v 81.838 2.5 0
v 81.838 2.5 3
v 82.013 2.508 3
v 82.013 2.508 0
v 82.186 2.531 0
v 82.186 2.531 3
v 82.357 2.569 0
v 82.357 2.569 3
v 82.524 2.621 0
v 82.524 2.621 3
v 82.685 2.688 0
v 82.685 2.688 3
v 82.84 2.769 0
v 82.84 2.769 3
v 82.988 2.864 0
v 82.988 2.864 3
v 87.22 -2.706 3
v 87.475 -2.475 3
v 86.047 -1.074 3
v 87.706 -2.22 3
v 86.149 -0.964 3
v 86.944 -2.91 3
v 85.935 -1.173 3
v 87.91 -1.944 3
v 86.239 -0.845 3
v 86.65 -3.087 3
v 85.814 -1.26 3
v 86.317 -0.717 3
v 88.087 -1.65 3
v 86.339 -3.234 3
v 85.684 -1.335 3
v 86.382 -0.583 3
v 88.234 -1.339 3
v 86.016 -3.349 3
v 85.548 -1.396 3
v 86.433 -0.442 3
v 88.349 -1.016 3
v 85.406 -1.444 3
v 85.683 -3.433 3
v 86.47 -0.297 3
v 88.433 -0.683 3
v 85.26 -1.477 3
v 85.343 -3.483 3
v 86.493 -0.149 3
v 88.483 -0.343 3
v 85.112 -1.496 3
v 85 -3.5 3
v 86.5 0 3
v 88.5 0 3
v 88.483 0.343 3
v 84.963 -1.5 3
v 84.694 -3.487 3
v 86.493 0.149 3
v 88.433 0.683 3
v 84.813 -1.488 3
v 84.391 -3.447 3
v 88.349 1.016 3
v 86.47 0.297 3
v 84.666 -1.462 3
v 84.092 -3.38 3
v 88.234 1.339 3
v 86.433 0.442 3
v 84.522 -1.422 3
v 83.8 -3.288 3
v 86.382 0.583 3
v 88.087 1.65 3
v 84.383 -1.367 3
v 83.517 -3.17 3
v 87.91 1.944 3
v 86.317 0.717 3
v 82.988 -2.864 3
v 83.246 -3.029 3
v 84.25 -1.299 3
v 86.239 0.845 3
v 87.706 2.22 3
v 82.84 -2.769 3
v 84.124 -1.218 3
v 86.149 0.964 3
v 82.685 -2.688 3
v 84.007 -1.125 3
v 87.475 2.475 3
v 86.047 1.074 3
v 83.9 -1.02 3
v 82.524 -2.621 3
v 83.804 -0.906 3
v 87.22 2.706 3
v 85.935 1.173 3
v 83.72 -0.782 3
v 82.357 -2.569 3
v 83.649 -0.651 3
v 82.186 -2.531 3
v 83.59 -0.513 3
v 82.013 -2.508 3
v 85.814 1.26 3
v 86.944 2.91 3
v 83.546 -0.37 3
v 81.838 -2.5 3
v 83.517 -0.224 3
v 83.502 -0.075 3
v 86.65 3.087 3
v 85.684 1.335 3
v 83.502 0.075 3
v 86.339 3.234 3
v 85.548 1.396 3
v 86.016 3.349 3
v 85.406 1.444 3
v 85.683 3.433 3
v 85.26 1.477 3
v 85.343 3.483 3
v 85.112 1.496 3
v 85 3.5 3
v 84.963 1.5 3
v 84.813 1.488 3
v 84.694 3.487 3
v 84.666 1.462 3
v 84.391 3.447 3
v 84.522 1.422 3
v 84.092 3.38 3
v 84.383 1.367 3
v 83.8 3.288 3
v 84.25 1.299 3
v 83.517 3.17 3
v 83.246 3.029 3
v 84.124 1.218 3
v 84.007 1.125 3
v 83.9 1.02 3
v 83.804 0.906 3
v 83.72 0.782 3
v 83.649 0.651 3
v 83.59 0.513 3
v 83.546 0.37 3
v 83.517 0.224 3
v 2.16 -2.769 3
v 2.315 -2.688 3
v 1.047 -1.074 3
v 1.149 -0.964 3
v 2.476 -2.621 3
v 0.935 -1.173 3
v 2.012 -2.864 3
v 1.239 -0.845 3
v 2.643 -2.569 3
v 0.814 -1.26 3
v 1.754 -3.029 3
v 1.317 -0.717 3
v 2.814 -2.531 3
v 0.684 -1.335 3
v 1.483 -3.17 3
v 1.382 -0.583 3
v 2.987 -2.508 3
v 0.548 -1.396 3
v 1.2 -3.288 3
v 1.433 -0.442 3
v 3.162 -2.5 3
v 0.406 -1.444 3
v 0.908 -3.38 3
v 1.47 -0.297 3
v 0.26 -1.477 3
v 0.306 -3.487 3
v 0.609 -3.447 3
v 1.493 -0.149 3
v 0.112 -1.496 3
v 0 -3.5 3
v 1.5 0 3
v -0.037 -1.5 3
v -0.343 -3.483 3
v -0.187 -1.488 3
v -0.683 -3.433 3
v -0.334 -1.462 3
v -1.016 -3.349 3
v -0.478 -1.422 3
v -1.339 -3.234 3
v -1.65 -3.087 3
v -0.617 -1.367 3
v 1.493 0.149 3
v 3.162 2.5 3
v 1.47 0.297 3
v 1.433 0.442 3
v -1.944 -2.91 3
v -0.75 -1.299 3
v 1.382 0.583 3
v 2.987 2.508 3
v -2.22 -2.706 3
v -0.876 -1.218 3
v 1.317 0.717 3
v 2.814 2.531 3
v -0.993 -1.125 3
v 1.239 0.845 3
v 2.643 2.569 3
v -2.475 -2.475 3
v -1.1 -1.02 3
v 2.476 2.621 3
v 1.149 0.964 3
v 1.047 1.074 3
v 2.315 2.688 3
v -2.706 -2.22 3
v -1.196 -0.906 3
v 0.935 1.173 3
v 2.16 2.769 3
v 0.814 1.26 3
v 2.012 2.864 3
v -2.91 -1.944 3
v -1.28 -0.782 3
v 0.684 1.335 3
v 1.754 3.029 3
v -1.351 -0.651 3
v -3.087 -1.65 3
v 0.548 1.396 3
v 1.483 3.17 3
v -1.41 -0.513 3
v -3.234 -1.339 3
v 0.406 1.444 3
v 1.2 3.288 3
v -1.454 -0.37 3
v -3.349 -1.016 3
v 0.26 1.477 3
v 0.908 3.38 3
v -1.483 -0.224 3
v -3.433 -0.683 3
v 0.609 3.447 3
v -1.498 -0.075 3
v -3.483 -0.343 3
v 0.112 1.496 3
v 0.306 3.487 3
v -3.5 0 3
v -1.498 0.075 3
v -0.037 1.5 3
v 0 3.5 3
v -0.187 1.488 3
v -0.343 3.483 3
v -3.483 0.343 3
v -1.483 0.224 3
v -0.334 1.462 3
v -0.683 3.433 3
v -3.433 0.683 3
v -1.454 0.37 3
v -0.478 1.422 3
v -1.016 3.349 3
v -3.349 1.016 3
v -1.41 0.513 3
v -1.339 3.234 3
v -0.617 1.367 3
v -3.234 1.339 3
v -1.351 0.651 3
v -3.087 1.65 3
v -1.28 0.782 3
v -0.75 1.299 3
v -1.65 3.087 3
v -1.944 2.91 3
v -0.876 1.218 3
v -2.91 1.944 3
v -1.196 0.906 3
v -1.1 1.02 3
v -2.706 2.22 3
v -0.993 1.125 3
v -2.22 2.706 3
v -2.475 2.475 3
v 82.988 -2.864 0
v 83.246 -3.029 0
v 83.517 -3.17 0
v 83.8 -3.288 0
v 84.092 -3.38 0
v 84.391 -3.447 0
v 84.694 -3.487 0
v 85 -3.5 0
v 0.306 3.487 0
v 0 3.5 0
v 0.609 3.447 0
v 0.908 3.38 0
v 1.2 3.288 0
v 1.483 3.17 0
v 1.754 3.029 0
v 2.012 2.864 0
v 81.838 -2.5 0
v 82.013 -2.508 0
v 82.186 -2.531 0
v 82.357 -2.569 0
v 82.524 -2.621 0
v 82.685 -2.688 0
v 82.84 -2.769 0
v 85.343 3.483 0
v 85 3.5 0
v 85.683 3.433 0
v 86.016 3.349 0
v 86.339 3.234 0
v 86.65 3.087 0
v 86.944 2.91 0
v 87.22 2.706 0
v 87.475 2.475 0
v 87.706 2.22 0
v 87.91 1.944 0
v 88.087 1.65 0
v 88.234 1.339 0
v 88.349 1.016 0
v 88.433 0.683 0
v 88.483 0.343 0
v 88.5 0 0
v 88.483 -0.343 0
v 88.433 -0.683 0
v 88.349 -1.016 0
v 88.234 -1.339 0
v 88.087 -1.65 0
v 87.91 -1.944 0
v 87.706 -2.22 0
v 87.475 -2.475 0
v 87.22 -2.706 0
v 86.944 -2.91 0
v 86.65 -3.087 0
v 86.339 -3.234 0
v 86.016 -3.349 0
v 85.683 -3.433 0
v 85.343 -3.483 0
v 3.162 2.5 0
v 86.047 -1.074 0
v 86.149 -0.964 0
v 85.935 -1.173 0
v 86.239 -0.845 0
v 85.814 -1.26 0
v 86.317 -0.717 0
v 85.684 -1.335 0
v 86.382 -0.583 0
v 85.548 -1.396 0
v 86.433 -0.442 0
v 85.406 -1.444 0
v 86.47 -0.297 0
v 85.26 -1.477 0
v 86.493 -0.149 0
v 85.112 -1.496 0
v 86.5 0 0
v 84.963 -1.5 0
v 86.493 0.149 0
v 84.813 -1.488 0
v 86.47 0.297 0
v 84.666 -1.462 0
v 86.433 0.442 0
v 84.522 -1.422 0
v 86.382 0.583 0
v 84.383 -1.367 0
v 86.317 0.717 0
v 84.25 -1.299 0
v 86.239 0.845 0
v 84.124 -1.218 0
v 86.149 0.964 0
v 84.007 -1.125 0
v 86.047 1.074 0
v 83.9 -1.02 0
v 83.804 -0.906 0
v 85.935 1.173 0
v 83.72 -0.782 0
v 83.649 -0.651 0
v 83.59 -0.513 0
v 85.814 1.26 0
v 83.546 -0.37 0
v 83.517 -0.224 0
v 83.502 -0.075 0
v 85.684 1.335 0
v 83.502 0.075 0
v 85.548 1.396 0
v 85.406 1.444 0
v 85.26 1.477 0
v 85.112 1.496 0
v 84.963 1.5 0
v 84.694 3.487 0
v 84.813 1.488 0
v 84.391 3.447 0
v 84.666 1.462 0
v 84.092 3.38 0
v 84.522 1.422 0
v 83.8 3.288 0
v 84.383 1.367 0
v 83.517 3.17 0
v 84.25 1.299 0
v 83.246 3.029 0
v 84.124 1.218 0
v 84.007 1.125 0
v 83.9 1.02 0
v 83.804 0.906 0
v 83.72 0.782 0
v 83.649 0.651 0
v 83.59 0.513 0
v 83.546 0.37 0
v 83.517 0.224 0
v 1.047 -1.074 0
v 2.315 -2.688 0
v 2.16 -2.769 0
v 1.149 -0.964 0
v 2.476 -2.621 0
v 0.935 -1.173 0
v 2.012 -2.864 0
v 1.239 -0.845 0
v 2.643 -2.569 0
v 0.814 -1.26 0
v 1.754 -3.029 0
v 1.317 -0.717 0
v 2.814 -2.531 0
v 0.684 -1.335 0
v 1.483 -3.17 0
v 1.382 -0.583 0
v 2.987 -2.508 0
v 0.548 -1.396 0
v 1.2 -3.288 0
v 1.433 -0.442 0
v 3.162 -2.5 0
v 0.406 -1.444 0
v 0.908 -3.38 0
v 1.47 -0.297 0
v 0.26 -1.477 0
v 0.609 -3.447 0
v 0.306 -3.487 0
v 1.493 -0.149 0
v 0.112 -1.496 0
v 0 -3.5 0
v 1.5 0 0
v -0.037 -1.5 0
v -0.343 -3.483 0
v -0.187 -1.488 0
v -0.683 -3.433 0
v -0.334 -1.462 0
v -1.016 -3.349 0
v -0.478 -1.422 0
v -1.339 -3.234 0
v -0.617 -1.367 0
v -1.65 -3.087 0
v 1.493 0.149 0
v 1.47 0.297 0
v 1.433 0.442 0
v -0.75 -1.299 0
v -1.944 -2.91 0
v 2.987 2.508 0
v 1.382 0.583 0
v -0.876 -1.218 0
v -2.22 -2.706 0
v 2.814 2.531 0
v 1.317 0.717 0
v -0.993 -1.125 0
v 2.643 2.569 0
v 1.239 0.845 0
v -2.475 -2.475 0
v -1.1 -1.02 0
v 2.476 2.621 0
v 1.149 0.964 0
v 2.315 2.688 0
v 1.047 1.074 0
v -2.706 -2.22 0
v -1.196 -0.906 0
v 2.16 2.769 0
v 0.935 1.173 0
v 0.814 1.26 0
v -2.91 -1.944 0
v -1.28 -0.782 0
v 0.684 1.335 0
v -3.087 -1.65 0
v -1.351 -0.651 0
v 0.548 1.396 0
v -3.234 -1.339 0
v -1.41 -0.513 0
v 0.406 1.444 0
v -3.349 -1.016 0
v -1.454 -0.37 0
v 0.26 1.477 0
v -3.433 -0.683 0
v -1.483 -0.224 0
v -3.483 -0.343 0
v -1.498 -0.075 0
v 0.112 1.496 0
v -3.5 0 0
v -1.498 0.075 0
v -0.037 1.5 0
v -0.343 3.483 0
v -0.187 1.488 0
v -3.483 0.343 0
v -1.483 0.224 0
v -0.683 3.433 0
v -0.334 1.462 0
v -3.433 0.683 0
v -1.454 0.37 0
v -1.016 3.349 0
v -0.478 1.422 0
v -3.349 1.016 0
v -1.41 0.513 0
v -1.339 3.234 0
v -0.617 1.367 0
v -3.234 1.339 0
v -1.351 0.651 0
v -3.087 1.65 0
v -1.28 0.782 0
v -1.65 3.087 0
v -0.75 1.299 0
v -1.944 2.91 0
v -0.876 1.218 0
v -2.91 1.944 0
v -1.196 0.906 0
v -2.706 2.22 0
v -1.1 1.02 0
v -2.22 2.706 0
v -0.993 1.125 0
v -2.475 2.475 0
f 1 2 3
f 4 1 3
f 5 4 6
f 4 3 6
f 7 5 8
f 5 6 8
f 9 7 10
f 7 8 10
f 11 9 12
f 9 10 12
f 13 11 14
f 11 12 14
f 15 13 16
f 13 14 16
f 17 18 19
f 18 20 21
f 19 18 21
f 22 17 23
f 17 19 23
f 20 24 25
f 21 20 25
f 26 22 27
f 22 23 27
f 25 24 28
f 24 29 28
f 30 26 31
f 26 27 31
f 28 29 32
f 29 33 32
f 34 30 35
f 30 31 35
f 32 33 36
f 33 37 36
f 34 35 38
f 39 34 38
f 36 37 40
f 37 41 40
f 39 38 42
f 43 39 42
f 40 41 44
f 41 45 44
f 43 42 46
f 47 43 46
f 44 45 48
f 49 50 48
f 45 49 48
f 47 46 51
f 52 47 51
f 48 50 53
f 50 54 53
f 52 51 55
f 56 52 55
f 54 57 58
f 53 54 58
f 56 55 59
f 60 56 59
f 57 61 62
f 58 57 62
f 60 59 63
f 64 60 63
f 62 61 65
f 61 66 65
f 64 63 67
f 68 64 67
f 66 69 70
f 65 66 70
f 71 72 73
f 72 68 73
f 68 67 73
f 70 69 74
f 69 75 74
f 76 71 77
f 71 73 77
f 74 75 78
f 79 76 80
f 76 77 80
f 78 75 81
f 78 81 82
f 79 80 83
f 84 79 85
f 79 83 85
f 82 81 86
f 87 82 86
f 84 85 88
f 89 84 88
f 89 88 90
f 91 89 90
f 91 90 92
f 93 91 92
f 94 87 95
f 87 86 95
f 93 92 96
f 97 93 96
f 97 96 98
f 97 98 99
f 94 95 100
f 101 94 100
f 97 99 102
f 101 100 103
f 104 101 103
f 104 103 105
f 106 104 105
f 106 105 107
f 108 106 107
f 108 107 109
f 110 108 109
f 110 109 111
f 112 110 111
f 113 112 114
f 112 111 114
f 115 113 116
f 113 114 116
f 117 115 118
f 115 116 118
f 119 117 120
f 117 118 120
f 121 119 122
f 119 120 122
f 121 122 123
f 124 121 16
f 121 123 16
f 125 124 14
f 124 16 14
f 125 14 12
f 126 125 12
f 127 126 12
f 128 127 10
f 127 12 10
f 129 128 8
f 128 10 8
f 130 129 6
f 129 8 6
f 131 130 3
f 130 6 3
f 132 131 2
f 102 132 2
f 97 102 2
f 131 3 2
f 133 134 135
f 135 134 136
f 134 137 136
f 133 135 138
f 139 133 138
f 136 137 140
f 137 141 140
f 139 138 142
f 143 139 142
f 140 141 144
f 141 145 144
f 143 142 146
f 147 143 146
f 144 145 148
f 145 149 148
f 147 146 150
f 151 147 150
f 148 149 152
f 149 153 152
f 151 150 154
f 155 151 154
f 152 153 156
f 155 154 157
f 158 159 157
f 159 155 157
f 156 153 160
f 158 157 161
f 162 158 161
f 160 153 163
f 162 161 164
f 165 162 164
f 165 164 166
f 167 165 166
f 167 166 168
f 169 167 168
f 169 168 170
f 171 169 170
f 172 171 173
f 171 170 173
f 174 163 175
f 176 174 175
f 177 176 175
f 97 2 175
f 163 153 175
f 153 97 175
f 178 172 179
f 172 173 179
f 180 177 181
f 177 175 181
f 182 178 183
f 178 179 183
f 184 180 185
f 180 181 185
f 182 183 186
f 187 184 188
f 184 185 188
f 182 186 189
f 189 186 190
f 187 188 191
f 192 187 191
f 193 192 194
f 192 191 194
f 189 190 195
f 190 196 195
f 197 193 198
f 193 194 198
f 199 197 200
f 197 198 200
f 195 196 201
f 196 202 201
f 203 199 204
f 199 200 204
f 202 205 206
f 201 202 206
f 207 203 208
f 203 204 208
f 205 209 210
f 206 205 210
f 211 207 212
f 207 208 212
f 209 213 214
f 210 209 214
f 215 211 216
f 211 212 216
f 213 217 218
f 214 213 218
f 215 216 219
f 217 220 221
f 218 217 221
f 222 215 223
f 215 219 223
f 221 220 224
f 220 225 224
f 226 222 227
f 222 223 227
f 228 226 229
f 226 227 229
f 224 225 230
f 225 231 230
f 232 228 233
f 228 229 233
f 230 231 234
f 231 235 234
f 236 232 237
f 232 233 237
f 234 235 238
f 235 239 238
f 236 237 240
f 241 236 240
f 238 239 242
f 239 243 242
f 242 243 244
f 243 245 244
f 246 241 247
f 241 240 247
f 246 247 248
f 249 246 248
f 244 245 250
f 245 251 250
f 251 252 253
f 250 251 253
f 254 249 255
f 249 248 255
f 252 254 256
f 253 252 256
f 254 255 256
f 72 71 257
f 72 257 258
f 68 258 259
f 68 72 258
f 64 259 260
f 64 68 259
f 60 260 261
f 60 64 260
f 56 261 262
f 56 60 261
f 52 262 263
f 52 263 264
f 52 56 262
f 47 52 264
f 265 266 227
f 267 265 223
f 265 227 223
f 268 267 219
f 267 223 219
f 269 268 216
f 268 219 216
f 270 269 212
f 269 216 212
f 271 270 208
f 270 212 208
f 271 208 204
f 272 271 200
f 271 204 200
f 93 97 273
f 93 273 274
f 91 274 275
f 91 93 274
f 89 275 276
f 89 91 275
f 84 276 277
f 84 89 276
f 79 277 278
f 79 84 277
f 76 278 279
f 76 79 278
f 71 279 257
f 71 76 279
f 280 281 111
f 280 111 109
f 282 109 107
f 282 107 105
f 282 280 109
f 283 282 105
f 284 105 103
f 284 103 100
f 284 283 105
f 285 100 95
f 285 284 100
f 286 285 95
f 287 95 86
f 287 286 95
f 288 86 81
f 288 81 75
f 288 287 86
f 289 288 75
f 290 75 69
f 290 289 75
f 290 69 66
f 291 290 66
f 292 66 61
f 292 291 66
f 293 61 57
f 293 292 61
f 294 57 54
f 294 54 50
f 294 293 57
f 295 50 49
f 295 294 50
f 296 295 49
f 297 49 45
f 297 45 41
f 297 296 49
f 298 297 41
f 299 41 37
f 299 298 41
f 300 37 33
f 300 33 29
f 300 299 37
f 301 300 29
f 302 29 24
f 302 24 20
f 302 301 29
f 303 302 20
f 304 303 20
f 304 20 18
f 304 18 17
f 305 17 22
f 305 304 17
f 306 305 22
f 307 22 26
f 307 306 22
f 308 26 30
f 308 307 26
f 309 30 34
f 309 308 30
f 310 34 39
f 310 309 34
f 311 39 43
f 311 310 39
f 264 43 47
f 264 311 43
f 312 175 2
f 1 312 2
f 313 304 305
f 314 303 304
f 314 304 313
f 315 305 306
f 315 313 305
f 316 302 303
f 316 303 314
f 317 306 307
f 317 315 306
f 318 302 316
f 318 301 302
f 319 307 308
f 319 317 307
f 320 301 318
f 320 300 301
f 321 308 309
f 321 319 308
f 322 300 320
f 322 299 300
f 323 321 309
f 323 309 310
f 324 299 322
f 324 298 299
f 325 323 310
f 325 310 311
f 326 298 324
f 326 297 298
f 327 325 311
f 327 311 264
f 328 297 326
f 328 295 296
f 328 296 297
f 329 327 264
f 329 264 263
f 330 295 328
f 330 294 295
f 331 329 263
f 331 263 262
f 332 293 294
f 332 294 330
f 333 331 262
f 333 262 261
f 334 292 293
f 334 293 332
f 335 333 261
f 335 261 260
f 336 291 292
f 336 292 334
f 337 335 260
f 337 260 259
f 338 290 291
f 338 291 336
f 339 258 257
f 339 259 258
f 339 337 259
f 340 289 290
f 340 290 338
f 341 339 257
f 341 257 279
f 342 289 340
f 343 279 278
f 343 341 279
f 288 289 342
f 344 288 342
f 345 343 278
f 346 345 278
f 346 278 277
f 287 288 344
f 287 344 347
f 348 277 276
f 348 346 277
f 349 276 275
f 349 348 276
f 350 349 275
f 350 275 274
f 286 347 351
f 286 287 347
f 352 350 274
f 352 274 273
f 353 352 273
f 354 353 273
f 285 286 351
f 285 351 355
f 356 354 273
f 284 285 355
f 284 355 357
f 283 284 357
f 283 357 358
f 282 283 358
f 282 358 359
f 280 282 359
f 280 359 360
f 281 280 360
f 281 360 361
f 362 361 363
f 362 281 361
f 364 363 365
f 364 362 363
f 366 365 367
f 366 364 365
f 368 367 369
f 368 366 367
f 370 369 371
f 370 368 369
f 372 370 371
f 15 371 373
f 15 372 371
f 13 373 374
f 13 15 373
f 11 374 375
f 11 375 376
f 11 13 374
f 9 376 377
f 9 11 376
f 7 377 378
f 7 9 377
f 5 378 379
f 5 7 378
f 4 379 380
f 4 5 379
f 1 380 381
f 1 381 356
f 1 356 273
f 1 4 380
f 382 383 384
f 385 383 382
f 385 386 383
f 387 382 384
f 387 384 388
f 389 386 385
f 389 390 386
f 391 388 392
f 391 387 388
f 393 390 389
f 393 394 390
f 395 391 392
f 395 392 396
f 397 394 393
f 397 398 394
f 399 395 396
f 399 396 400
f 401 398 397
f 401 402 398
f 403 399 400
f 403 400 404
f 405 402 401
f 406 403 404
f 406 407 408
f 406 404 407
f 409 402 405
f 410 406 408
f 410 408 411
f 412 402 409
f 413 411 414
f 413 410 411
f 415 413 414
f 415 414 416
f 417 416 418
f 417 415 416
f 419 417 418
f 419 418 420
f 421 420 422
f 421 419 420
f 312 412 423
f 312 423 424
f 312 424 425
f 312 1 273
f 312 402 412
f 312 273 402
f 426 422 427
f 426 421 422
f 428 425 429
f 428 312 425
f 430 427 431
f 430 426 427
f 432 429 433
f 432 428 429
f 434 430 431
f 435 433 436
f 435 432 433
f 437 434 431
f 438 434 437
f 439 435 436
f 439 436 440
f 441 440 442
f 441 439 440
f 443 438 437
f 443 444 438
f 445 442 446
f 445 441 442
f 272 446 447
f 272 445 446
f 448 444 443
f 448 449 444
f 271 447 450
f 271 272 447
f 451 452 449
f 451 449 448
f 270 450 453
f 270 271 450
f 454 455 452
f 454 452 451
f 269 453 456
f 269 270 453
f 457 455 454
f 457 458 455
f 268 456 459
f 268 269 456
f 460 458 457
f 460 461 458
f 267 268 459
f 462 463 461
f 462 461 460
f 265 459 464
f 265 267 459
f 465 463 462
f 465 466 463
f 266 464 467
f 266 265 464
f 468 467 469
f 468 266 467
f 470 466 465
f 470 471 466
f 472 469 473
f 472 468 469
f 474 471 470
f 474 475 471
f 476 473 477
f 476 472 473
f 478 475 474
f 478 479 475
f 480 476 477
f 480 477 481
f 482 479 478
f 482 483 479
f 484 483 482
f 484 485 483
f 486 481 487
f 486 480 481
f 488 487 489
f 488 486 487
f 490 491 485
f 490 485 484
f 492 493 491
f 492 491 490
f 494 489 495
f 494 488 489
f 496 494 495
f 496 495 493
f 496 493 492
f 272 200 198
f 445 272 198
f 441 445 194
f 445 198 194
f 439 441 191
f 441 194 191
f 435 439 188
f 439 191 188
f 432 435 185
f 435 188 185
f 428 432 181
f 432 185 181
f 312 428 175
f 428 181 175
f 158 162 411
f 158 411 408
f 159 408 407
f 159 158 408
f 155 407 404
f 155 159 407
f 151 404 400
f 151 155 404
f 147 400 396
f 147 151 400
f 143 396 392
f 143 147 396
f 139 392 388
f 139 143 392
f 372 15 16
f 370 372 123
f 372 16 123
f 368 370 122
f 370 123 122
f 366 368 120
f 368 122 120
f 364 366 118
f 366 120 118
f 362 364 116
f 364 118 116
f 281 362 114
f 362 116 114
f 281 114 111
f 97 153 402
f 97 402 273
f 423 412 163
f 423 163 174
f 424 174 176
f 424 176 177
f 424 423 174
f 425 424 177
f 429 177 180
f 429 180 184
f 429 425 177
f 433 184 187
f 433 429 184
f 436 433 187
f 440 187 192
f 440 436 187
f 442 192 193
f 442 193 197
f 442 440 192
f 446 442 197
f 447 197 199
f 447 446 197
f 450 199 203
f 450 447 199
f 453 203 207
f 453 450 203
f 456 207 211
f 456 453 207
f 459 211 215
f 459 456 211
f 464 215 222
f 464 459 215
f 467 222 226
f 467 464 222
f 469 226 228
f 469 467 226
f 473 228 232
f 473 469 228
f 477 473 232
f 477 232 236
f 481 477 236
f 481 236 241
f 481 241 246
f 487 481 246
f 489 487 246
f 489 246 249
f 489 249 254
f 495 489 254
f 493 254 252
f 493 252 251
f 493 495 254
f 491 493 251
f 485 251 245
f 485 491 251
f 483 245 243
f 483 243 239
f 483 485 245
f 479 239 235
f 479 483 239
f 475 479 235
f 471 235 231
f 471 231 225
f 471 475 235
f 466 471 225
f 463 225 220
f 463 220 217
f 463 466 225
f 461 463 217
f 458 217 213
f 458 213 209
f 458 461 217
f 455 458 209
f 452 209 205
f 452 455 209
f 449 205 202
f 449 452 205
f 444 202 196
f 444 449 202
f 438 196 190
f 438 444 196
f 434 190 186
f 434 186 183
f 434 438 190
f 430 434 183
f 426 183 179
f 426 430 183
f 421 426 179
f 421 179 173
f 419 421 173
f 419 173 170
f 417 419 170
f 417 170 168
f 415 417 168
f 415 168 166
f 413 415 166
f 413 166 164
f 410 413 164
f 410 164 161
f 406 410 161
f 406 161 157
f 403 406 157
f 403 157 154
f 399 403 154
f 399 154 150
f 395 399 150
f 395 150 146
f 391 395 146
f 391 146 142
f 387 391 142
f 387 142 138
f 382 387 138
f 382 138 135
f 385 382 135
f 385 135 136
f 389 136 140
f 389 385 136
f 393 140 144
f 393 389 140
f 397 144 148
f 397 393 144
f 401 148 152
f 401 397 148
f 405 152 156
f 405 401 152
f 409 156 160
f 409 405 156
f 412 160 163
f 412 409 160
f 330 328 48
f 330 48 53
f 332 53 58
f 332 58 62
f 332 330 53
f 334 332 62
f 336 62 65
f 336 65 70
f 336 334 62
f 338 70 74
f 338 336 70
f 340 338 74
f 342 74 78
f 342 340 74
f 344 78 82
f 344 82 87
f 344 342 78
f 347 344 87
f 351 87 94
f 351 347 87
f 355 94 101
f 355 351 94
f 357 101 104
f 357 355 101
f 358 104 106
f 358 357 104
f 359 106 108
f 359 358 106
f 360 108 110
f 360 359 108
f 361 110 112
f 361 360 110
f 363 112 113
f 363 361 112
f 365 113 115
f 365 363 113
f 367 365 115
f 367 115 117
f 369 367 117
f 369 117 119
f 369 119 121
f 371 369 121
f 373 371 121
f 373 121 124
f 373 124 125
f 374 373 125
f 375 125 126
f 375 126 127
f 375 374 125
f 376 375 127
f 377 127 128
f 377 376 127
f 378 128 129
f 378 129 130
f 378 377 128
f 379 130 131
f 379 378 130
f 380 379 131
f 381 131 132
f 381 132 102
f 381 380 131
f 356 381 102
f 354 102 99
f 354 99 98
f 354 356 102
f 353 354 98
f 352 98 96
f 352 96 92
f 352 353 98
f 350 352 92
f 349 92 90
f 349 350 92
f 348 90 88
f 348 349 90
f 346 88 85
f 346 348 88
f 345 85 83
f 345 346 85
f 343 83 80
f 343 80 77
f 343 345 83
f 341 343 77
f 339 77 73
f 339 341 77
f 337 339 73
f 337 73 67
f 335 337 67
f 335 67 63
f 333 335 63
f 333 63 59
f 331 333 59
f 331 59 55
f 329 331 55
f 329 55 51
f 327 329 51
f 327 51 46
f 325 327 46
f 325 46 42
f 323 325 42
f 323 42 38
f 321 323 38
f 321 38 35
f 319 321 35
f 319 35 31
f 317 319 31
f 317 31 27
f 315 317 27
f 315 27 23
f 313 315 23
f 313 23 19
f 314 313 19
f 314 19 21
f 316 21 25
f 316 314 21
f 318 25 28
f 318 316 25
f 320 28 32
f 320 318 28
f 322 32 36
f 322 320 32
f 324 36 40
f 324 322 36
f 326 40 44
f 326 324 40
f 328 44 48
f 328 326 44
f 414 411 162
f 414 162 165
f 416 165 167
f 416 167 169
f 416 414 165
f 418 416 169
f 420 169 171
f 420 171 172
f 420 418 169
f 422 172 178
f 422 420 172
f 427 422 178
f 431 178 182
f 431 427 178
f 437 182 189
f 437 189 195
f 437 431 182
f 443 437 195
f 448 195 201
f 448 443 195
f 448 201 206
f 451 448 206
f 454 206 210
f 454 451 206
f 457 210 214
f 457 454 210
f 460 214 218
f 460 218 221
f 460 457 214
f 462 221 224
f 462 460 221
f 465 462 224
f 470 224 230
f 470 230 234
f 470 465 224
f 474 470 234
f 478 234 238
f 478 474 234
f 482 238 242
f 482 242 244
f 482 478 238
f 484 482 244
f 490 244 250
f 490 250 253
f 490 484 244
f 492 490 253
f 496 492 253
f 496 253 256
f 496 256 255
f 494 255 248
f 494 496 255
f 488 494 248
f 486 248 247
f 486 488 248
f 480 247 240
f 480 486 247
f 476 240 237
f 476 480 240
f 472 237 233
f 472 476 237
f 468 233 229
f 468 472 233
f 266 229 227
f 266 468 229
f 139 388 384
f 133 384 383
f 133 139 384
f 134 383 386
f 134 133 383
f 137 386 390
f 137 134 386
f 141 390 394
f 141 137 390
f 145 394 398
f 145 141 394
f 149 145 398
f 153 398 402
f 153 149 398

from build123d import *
from build123d.topology import SkipClean

# Parameters (mm, degrees)
SKETCH_1_R          = 1.5
EXTRUDE_1_DEPTH     = 3
CUT_EXTRUDE_1_DEPTH = 89.619975175


with BuildPart() as part:
    # 草图1 → 凸台-拉伸1 (new body)
    with BuildSketch(Plane.XY):
        with BuildLine():
            Line((0, 3.5), (85, 3.5))
            ThreePointArc((85, 3.5), (88.5, 0), (85, -3.5))
            Line((85, -3.5), (0, -3.5))
            ThreePointArc((0, -3.5), (-3.5, 0), (0, 3.5))
        make_face()
        Circle(SKETCH_1_R, mode=Mode.SUBTRACT)
        with Locations((85, 0)):
            Circle(SKETCH_1_R, mode=Mode.SUBTRACT)
    extrude(amount=EXTRUDE_1_DEPTH)

    # 草图2 → 切除-拉伸1 (cut, through all)
    with SkipClean():  # the faces are left unmerged after this step: merging them gives an invalid solid
        with BuildSketch(Plane.XY.offset(3)):
            with BuildLine():
                Line((3.16227766, 2.5), (81.83772234, 2.5))
                ThreePointArc((81.83772234, 2.5), (82.440745029, 2.593074822), (82.987641489, 2.863636364))
                ThreePointArc((82.987641489, 2.863636364), (83.944710294, 3.337119062), (85, 3.5))
                Line((85, 3.5), (0, 3.5))
                ThreePointArc((0, 3.5), (1.055289706, 3.337119062), (2.012358511, 2.863636364))
                ThreePointArc((2.012358511, 2.863636364), (2.559254971, 2.593074822), (3.16227766, 2.5))
            make_face()
            with BuildLine():
                Line((3.16227766, -2.5), (81.83772234, -2.5))
                ThreePointArc((81.83772234, -2.5), (82.440745029, -2.593074822), (82.987641489, -2.863636364))
                ThreePointArc((82.987641489, -2.863636364), (83.944710294, -3.337119062), (85, -3.5))
                Line((85, -3.5), (0, -3.5))
                ThreePointArc((0, -3.5), (1.055289706, -3.337119062), (2.012358511, -2.863636364))
                ThreePointArc((2.012358511, -2.863636364), (2.559254971, -2.593074822), (3.16227766, -2.5))
            make_face()
        extrude(amount=-CUT_EXTRUDE_1_DEPTH, mode=Mode.SUBTRACT)


solid = part.part
